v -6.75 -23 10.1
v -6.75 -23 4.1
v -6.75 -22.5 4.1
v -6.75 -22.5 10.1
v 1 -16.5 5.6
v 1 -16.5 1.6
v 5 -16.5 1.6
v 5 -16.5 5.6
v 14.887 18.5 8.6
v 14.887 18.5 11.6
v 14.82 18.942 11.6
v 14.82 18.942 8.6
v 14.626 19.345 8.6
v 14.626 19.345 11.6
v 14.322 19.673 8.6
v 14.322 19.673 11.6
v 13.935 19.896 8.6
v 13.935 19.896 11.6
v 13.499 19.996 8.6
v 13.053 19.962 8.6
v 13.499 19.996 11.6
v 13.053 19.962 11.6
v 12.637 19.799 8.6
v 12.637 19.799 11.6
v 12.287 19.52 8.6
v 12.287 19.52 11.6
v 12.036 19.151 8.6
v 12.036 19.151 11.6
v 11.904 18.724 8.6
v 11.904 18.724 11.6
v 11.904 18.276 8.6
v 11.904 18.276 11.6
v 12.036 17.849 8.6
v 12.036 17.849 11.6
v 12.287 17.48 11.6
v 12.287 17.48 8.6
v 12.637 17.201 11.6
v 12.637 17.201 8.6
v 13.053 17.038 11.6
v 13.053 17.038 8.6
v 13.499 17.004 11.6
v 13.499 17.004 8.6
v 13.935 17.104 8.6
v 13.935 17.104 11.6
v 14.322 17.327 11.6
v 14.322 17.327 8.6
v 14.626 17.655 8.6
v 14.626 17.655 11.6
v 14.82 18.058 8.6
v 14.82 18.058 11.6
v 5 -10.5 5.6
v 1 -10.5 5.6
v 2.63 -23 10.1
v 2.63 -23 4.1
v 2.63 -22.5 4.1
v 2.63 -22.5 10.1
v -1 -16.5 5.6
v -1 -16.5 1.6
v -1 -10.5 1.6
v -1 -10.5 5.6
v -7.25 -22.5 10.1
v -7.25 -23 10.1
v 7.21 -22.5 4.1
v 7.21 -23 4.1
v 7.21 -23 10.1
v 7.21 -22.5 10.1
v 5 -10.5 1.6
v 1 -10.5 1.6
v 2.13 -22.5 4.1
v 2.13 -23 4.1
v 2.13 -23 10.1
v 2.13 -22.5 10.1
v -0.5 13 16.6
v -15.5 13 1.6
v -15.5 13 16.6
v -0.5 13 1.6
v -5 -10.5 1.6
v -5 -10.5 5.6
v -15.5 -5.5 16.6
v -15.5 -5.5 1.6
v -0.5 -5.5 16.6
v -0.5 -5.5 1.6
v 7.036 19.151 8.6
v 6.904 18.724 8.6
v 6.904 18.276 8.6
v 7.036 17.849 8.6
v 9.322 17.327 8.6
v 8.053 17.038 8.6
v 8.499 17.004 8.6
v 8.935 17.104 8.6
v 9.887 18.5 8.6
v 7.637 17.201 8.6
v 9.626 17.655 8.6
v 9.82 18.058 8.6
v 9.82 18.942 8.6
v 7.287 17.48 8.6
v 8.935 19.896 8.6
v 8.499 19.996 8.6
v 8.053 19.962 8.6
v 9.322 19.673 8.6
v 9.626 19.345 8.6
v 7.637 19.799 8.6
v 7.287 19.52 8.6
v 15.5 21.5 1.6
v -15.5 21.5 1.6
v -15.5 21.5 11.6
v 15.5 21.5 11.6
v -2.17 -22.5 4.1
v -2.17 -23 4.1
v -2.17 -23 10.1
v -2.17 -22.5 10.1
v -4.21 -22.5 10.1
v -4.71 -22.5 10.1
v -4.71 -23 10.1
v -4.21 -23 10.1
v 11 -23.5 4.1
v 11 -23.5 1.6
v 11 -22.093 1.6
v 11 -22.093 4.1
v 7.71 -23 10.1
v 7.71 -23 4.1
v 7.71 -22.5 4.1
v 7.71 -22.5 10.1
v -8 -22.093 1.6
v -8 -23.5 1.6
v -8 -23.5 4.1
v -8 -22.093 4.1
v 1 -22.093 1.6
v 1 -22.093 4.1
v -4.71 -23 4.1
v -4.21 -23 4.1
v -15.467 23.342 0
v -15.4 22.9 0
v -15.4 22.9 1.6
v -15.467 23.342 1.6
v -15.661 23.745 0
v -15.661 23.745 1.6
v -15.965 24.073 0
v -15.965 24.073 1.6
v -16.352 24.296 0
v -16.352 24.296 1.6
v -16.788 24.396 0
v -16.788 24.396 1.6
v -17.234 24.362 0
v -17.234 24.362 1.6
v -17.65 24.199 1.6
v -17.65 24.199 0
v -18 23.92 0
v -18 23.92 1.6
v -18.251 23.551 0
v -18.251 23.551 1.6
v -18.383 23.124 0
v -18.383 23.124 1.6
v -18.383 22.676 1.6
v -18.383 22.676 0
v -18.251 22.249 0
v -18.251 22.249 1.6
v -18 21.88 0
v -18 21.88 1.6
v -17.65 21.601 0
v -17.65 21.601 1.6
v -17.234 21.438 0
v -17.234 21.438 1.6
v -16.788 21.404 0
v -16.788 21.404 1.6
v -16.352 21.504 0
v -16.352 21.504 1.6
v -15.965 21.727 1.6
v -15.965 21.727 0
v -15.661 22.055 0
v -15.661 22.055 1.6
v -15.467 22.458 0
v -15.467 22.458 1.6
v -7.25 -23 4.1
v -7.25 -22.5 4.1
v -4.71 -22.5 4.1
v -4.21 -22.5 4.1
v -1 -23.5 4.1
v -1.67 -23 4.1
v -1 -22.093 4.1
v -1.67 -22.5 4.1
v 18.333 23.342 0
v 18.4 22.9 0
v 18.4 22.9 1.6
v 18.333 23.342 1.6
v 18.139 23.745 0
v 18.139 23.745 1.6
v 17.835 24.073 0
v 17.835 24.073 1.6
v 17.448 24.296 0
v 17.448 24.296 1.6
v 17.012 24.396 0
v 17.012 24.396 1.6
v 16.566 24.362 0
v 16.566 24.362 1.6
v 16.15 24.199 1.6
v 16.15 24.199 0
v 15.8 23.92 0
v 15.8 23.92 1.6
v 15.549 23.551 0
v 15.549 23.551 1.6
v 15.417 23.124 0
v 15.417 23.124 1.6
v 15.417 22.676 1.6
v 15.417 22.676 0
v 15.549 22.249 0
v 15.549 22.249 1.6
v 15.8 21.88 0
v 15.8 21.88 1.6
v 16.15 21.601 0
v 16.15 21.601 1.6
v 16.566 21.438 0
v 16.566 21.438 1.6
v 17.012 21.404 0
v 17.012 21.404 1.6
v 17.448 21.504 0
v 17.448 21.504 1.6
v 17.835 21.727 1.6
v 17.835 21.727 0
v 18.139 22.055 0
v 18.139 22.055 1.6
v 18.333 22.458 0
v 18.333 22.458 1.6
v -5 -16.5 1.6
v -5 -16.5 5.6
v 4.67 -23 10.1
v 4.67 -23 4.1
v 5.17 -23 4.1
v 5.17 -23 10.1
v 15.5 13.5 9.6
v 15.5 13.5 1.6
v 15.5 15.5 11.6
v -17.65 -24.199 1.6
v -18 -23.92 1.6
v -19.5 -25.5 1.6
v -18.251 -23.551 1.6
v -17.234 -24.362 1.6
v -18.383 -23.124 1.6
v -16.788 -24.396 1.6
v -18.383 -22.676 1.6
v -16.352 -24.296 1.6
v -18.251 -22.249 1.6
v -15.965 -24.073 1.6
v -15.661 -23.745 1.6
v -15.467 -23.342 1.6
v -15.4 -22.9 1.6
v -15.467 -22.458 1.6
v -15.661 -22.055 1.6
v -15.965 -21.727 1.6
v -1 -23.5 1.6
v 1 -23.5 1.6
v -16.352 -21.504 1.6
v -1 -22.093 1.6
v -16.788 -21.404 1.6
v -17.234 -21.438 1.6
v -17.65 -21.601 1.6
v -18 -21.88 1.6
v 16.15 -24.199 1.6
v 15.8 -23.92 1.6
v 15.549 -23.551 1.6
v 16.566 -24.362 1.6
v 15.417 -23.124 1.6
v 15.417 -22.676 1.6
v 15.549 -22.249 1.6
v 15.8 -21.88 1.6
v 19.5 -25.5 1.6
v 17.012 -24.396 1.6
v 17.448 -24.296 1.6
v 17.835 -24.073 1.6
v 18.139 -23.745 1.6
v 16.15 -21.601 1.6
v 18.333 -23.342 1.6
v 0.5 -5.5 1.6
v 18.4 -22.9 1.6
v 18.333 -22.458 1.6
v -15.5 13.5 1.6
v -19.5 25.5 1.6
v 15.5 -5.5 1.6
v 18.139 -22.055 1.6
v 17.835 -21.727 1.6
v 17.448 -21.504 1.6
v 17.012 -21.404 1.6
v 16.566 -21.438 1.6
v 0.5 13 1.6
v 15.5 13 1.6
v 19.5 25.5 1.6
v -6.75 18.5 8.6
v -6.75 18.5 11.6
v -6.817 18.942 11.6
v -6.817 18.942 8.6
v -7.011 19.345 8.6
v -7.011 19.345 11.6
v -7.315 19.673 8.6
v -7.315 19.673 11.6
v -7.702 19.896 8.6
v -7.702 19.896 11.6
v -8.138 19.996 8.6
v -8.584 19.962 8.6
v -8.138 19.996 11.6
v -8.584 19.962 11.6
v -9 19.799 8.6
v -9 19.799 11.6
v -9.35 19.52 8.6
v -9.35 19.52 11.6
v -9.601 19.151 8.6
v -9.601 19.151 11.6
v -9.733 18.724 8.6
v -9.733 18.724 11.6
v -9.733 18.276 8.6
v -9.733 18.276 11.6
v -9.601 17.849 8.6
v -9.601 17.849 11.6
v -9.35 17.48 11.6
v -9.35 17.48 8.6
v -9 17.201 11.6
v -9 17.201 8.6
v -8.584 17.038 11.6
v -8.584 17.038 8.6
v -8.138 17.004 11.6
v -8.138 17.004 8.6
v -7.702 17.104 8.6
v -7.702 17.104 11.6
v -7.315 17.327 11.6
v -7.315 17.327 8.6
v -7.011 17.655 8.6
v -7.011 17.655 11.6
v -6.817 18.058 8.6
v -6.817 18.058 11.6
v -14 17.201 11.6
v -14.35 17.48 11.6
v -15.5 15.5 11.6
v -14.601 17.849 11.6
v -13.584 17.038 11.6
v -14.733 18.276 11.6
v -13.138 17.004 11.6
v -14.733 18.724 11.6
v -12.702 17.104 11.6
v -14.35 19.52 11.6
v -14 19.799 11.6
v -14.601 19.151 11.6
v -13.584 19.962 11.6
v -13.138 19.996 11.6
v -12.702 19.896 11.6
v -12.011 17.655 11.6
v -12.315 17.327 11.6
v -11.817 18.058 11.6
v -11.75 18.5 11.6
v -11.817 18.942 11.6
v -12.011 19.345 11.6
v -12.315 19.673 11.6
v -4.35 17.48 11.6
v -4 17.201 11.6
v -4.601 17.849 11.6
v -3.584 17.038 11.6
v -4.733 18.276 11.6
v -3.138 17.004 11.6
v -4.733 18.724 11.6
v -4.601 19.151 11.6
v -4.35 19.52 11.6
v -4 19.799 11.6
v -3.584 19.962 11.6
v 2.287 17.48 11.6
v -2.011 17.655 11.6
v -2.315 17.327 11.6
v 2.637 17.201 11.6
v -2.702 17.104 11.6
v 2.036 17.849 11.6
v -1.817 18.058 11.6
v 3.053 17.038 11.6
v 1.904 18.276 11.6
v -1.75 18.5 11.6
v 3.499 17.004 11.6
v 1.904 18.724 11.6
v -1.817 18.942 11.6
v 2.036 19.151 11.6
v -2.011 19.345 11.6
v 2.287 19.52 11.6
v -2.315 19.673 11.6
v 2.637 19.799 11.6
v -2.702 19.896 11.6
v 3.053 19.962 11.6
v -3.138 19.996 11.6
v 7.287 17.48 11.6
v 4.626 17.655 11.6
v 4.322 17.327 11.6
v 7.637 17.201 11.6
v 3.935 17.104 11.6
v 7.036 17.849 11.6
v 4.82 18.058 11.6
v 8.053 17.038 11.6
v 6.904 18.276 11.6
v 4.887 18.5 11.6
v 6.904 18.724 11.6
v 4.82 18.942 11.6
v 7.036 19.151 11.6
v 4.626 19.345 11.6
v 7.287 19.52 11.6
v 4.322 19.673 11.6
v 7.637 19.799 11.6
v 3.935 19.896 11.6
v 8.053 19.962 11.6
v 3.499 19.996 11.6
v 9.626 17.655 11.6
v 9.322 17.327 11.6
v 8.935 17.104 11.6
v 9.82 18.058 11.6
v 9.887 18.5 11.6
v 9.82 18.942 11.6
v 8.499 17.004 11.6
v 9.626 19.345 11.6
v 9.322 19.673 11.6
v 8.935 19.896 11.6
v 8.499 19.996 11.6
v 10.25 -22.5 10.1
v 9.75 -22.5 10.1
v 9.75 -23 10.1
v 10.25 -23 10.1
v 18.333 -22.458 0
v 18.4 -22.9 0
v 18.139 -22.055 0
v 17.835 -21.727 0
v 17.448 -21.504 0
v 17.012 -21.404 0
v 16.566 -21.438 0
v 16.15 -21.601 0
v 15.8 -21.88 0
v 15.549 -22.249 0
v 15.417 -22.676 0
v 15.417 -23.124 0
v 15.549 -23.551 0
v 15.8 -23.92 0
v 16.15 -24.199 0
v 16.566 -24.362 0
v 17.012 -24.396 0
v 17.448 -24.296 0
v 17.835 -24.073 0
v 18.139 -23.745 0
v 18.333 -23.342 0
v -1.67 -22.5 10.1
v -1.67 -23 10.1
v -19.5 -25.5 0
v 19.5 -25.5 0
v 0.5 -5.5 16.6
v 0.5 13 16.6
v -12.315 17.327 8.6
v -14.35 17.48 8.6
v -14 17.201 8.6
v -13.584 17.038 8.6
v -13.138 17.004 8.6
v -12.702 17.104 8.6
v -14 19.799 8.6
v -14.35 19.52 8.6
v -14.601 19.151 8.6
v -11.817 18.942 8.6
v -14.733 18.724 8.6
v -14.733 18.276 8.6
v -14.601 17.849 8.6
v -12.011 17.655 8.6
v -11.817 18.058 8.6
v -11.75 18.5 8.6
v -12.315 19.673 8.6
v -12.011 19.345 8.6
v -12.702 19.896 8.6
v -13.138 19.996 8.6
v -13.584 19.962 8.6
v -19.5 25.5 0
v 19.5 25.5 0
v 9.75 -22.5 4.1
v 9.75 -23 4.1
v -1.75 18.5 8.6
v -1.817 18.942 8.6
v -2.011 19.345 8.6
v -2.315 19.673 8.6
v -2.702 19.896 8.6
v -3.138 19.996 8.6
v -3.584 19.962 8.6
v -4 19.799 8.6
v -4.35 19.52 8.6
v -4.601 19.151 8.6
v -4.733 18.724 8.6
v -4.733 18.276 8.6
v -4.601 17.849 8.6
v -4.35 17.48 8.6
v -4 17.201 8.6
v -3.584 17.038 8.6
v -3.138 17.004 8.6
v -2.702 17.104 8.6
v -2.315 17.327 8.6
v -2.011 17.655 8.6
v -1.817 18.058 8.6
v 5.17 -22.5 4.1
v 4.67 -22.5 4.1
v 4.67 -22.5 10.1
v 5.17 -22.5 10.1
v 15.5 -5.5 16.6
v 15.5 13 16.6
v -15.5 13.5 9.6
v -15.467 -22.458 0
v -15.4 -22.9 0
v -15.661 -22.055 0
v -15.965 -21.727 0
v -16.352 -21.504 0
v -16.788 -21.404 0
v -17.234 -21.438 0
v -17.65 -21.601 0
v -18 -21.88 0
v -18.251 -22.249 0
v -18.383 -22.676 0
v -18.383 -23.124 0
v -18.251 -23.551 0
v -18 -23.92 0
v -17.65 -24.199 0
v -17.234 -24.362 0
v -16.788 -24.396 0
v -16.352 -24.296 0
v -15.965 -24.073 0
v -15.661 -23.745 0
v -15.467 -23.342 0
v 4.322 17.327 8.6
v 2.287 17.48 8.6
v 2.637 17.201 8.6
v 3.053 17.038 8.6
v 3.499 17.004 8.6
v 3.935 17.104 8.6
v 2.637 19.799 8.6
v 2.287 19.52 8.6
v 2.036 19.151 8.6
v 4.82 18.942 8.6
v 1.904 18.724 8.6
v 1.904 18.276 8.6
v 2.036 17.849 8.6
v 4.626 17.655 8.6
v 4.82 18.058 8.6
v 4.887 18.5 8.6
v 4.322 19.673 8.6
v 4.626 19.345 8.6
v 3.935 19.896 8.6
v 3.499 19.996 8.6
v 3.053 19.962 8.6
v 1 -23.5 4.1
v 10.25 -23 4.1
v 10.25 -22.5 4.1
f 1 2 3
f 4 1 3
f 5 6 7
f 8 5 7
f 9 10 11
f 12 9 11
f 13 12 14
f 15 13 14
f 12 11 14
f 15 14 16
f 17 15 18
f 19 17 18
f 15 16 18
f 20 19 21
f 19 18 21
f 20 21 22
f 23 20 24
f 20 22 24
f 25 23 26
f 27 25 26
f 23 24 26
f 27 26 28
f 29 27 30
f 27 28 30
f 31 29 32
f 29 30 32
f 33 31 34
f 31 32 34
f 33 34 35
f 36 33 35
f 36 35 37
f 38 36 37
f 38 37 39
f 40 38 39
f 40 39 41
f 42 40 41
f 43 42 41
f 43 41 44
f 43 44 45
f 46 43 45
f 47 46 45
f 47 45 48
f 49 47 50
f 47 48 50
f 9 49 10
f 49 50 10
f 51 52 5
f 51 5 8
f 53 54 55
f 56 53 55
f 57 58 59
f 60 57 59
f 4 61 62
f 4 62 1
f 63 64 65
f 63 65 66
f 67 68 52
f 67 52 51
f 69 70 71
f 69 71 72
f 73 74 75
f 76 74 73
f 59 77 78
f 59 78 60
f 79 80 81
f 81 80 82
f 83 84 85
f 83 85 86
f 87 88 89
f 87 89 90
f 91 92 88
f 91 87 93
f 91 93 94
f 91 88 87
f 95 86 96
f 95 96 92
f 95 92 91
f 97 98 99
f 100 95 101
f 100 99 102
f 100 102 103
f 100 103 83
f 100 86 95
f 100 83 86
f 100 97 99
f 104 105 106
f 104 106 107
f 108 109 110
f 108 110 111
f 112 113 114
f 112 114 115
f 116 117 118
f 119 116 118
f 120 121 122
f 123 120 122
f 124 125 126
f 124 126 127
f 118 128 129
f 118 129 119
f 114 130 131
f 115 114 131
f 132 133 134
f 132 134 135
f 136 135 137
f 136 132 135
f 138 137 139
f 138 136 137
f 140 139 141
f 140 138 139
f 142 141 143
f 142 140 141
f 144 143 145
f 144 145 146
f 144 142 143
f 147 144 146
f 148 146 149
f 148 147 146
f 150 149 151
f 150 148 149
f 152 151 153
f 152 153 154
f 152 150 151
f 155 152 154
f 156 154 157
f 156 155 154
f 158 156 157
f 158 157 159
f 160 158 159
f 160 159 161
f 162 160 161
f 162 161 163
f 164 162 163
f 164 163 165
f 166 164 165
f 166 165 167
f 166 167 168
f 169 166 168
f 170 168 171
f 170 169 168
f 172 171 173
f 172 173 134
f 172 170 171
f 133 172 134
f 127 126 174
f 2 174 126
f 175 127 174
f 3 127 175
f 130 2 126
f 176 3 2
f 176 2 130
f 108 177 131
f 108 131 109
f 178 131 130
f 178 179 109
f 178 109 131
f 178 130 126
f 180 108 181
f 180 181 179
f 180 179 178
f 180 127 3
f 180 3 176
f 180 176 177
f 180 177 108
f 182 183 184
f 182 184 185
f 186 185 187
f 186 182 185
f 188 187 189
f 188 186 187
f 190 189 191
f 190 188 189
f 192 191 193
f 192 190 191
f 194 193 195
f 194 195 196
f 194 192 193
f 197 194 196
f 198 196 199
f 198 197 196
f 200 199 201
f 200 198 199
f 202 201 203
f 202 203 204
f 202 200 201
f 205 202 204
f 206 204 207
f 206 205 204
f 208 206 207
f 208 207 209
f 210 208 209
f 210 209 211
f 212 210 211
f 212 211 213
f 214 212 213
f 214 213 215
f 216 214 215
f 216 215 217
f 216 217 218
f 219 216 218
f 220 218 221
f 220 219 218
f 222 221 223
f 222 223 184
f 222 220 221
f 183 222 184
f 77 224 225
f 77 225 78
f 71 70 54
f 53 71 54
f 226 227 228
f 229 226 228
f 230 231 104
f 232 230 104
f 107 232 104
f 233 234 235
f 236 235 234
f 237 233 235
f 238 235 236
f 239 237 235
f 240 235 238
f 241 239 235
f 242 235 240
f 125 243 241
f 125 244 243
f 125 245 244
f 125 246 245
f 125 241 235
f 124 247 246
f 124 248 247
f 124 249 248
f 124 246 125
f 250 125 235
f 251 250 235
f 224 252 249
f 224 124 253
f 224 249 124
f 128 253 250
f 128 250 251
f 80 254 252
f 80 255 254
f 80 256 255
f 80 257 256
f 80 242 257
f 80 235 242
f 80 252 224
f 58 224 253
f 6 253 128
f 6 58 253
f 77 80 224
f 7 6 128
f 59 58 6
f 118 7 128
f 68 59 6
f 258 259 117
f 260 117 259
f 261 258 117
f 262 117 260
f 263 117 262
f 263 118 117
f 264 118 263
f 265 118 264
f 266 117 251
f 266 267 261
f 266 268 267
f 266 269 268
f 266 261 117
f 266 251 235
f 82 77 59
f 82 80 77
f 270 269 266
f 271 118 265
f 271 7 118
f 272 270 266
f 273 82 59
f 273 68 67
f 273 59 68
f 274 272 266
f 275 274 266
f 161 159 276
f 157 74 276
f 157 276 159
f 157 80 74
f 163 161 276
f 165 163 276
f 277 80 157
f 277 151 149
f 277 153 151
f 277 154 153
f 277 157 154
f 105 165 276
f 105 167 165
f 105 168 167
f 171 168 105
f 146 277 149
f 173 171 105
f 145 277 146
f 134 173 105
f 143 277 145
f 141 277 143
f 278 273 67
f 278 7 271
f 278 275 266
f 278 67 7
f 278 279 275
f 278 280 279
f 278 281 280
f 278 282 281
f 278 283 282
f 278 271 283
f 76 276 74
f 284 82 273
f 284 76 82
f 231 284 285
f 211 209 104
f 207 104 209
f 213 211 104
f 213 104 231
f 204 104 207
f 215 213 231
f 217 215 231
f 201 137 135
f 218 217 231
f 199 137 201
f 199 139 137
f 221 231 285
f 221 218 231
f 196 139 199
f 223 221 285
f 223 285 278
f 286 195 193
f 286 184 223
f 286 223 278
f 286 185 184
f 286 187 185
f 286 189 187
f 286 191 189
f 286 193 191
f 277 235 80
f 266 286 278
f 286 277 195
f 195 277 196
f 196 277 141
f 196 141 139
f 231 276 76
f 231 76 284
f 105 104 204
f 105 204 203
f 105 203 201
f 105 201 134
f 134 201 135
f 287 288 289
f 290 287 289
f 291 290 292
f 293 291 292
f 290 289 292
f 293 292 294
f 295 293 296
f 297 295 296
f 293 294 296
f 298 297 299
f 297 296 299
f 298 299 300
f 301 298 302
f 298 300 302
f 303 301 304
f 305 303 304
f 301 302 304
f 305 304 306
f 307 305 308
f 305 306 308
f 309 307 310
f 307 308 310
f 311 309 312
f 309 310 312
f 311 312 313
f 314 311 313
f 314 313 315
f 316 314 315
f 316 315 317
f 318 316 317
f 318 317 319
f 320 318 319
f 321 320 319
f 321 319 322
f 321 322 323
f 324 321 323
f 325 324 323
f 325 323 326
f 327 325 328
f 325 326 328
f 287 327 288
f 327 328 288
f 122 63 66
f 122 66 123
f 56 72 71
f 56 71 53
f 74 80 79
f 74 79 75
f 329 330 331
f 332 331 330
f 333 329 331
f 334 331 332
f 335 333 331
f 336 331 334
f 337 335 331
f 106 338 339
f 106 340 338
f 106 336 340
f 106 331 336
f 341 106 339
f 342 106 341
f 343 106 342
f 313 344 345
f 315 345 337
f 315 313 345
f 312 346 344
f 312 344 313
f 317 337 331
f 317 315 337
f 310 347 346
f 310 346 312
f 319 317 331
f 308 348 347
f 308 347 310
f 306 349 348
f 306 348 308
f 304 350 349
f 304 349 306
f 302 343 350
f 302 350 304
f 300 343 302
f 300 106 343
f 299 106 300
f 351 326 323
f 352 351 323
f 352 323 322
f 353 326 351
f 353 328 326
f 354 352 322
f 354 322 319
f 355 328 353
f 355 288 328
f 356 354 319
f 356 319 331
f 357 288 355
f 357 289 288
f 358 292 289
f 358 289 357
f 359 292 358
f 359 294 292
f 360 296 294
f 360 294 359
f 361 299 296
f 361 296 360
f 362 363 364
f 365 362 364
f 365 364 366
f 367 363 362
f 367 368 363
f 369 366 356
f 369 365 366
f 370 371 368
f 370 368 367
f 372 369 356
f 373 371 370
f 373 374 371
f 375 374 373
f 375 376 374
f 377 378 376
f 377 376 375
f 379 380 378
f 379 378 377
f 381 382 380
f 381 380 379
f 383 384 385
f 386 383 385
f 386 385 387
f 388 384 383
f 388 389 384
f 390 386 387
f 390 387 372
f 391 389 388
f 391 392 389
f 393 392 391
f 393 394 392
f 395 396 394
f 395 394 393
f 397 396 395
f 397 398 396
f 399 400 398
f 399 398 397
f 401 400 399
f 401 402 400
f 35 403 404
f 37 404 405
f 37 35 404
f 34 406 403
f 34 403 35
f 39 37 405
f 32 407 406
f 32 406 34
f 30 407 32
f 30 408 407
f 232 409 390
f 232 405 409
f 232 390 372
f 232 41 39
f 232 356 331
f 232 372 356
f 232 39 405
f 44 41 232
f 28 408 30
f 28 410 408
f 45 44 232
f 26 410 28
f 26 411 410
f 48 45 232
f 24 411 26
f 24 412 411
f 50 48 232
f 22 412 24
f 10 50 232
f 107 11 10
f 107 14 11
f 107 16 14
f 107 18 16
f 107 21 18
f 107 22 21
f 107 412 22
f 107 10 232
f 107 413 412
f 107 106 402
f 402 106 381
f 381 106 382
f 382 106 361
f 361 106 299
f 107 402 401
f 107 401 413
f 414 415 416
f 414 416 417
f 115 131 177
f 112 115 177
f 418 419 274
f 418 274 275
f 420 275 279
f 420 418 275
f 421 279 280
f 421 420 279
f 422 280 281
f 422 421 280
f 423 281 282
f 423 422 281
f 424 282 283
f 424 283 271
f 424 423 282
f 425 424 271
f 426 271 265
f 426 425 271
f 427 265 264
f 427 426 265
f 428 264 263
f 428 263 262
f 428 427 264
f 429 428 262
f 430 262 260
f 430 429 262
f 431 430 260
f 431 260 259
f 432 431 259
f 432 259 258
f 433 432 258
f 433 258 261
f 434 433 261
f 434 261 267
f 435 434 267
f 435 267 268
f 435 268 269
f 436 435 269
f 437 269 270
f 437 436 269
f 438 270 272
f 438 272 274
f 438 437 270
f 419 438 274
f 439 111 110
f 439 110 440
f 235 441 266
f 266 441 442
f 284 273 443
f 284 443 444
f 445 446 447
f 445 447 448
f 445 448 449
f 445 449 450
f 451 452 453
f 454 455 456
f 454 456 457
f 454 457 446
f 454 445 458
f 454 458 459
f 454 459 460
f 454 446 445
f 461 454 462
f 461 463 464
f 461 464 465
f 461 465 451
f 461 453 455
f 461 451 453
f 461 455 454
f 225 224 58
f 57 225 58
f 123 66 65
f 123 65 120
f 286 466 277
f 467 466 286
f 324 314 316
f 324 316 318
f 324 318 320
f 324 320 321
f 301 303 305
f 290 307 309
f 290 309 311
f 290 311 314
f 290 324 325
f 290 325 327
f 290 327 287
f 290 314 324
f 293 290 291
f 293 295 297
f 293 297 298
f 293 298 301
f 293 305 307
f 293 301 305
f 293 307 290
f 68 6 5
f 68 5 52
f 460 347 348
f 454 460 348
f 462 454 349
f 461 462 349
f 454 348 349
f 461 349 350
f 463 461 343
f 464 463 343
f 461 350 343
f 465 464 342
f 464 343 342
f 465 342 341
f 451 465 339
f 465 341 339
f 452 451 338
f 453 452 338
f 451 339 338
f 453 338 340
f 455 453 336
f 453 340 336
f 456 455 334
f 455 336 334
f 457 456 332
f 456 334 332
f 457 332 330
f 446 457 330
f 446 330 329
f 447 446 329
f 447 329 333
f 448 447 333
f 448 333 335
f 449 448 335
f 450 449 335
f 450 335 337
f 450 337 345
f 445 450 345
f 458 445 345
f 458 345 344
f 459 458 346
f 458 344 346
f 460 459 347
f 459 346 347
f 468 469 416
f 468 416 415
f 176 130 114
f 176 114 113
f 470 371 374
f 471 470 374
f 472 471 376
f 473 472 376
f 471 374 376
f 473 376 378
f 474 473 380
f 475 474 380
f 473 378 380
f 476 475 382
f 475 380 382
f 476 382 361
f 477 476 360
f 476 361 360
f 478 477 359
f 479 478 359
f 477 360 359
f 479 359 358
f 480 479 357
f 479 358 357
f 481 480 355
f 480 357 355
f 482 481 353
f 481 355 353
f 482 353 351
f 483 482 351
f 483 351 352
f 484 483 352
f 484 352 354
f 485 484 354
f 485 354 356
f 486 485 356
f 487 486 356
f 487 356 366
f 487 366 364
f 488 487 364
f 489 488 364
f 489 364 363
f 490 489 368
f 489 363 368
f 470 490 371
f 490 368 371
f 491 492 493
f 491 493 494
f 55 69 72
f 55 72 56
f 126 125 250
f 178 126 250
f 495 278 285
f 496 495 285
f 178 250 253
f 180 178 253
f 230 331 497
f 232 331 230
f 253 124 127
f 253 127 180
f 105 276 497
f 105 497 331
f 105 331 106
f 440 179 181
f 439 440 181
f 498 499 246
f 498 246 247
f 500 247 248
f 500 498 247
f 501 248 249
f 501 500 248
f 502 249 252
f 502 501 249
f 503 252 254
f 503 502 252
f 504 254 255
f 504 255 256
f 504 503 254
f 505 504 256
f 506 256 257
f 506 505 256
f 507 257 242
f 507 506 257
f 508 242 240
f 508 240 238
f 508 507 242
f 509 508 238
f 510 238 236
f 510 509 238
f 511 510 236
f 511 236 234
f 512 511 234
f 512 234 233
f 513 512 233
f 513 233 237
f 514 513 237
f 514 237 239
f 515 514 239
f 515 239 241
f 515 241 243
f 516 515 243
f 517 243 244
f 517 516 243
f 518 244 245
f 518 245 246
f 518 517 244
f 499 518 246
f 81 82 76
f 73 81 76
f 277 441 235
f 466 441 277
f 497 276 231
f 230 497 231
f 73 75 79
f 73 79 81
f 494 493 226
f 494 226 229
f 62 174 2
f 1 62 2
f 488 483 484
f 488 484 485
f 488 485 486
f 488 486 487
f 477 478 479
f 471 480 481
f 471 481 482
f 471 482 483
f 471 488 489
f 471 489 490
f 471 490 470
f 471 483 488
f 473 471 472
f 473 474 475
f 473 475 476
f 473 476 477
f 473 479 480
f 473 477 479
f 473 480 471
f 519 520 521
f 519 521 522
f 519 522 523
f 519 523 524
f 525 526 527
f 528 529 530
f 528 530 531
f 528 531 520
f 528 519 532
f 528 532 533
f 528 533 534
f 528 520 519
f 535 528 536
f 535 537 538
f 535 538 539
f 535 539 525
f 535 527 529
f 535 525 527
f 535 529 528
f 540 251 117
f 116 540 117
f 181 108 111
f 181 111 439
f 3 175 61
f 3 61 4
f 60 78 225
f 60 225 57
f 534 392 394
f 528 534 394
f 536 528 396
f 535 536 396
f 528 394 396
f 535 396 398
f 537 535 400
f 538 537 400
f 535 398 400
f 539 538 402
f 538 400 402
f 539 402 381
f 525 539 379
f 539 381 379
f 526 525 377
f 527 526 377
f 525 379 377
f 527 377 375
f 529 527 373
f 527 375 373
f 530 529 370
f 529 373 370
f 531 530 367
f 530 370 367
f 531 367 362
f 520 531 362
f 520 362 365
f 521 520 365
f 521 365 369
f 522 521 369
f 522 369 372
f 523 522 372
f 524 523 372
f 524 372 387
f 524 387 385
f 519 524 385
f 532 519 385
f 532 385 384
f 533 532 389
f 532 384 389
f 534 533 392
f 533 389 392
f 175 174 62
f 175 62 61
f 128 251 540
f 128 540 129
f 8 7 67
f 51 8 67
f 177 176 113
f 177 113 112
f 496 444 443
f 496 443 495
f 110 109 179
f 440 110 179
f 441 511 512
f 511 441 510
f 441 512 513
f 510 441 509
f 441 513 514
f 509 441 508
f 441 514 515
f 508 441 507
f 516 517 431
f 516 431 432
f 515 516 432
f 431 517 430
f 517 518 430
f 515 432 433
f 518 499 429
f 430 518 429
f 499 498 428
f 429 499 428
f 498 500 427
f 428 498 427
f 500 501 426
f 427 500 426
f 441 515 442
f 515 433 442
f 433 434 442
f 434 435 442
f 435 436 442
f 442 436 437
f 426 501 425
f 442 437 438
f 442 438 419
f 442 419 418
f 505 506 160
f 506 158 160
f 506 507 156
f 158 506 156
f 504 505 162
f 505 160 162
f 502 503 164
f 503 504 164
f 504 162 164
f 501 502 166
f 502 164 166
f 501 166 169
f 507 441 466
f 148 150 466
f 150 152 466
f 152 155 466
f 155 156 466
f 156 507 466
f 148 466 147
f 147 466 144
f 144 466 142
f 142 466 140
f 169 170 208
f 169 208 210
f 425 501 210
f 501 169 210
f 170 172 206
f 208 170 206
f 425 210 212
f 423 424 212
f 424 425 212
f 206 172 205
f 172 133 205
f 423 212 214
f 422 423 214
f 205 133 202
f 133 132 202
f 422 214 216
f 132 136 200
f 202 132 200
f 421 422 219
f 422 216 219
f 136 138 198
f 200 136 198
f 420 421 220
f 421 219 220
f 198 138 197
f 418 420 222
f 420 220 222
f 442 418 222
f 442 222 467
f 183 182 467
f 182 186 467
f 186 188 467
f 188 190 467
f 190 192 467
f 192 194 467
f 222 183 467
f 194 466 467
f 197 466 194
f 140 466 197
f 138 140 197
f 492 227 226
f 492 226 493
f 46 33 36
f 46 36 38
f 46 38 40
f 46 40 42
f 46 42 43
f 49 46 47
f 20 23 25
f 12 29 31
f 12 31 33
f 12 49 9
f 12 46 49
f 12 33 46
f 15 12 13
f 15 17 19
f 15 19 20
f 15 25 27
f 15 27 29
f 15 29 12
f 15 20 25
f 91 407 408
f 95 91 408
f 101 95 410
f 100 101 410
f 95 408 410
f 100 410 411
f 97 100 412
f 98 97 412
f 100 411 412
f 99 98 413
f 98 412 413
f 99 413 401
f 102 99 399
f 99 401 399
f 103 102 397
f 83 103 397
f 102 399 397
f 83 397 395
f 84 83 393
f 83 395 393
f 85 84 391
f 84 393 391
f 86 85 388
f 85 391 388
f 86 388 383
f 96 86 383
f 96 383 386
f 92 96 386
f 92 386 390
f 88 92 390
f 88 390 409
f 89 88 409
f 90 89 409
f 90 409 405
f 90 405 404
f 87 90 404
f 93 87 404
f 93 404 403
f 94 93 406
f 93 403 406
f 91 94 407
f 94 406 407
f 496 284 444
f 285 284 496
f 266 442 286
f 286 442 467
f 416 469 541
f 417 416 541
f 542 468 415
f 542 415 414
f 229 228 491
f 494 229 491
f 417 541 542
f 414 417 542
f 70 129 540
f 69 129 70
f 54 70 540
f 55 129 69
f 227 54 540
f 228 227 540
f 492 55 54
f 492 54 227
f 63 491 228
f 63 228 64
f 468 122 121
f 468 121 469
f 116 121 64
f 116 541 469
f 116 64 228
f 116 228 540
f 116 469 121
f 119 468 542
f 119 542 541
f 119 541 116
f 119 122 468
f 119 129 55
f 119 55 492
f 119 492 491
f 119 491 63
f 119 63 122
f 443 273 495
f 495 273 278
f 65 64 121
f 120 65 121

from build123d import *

# Parameters (mm, degrees)
F0_W      = 39
F0_H      = 51
F0_R      = 1.5
F1_DEPTH  = 1.6
F2_W      = 15
F2_H      = 18.5
F3_DEPTH  = 15
F4_W      = 31
F4_H      = 8
F5_DEPTH  = 10
F6_SIZE   = 2
F7_R      = 1.5
F8_DEPTH  = 3
F9_W      = 4
F9_H      = 6
F10_DEPTH = 4
F11_W     = 7
F11_H     = 1.406925
F11_W_2   = 10
F12_DEPTH = 2.5
F13_W     = 0.5
F13_H     = 0.5
F14_DEPTH = 6


with BuildPart() as f1:
    # F0 (on Top) → F1 (new body)
    with BuildSketch(Plane.XY):
        Rectangle(F0_W, F0_H)
        with Locations((-16.9, -22.9)):
            Circle(F0_R, mode=Mode.SUBTRACT)
        with Locations((16.9, -22.9)):
            Circle(F0_R, mode=Mode.SUBTRACT)
        with Locations((-16.9, 22.9)):
            Circle(F0_R, mode=Mode.SUBTRACT)
        with Locations((16.9, 22.9)):
            Circle(F0_R, mode=Mode.SUBTRACT)
    extrude(amount=F1_DEPTH)

    # F2 (on face) → F3 (join)
    with BuildSketch(Plane.XY.offset(1.6)):
        with Locations((-8, 3.75)):
            Rectangle(F2_W, F2_H)
        with Locations((8, 3.75)):
            Rectangle(F2_W, F2_H)
    extrude(amount=F3_DEPTH)

    # F4 (on face) → F5 (join)
    with BuildSketch(Plane.XY.offset(1.6)):
        with Locations((0, 17.5)):
            Rectangle(F4_W, F4_H)
    extrude(amount=F5_DEPTH)

    # F6
    f6_edges = [f1.edges().sort_by_distance(p)[0] for p in [
        (0, 13.5, 11.6),
    ]]
    chamfer(f6_edges, length=F6_SIZE)

    # F7 (on face) → F8 (cut)
    with BuildSketch(Plane.XY.offset(11.6)):
        with Locations((-13.25, 18.5)):
            Circle(F7_R)
        with Locations((-8.25, 18.5)):
            Circle(F7_R)
        with Locations((-3.25, 18.5)):
            Circle(F7_R)
        with Locations((3.386981, 18.5)):
            Circle(F7_R)
        with Locations((8.386981, 18.5)):
            Circle(F7_R)
        with Locations((13.386981, 18.5)):
            Circle(F7_R)
    extrude(amount=-F8_DEPTH, mode=Mode.SUBTRACT)

    # F9 (on face) → F10 (join)
    with BuildSketch(Plane.XY.offset(1.6)):
        with Locations((-3, -13.5)):
            Rectangle(F9_W, F9_H)
        with Locations((3, -13.5)):
            Rectangle(F9_W, F9_H)
    extrude(amount=F10_DEPTH)

    # F11 (on face) → F12 (join)
    with BuildSketch(Plane.XY.offset(1.6)):
        with Locations((-4.5, -22.796537)):
            Rectangle(F11_W, F11_H)
        with Locations((6, -22.796537)):
            Rectangle(F11_W_2, F11_H)
    extrude(amount=F12_DEPTH)

    # F13 (on face) → F14 (join)
    with BuildSketch(Plane.XY.offset(4.1)):
        with Locations((-7, -22.75)):
            Rectangle(F13_W, F13_H)
        with Locations((-4.46, -22.75)):
            Rectangle(F13_W, F13_H)
        with Locations((-1.92, -22.75)):
            Rectangle(F13_W, F13_H)
        with Locations((2.38, -22.75)):
            Rectangle(F13_W, F13_H)
        with Locations((4.92, -22.75)):
            Rectangle(F13_W, F13_H)
        with Locations((7.46, -22.75)):
            Rectangle(F13_W, F13_H)
        with Locations((10, -22.75)):
            Rectangle(F13_W, F13_H)
    extrude(amount=F14_DEPTH)


solid = f1.part
